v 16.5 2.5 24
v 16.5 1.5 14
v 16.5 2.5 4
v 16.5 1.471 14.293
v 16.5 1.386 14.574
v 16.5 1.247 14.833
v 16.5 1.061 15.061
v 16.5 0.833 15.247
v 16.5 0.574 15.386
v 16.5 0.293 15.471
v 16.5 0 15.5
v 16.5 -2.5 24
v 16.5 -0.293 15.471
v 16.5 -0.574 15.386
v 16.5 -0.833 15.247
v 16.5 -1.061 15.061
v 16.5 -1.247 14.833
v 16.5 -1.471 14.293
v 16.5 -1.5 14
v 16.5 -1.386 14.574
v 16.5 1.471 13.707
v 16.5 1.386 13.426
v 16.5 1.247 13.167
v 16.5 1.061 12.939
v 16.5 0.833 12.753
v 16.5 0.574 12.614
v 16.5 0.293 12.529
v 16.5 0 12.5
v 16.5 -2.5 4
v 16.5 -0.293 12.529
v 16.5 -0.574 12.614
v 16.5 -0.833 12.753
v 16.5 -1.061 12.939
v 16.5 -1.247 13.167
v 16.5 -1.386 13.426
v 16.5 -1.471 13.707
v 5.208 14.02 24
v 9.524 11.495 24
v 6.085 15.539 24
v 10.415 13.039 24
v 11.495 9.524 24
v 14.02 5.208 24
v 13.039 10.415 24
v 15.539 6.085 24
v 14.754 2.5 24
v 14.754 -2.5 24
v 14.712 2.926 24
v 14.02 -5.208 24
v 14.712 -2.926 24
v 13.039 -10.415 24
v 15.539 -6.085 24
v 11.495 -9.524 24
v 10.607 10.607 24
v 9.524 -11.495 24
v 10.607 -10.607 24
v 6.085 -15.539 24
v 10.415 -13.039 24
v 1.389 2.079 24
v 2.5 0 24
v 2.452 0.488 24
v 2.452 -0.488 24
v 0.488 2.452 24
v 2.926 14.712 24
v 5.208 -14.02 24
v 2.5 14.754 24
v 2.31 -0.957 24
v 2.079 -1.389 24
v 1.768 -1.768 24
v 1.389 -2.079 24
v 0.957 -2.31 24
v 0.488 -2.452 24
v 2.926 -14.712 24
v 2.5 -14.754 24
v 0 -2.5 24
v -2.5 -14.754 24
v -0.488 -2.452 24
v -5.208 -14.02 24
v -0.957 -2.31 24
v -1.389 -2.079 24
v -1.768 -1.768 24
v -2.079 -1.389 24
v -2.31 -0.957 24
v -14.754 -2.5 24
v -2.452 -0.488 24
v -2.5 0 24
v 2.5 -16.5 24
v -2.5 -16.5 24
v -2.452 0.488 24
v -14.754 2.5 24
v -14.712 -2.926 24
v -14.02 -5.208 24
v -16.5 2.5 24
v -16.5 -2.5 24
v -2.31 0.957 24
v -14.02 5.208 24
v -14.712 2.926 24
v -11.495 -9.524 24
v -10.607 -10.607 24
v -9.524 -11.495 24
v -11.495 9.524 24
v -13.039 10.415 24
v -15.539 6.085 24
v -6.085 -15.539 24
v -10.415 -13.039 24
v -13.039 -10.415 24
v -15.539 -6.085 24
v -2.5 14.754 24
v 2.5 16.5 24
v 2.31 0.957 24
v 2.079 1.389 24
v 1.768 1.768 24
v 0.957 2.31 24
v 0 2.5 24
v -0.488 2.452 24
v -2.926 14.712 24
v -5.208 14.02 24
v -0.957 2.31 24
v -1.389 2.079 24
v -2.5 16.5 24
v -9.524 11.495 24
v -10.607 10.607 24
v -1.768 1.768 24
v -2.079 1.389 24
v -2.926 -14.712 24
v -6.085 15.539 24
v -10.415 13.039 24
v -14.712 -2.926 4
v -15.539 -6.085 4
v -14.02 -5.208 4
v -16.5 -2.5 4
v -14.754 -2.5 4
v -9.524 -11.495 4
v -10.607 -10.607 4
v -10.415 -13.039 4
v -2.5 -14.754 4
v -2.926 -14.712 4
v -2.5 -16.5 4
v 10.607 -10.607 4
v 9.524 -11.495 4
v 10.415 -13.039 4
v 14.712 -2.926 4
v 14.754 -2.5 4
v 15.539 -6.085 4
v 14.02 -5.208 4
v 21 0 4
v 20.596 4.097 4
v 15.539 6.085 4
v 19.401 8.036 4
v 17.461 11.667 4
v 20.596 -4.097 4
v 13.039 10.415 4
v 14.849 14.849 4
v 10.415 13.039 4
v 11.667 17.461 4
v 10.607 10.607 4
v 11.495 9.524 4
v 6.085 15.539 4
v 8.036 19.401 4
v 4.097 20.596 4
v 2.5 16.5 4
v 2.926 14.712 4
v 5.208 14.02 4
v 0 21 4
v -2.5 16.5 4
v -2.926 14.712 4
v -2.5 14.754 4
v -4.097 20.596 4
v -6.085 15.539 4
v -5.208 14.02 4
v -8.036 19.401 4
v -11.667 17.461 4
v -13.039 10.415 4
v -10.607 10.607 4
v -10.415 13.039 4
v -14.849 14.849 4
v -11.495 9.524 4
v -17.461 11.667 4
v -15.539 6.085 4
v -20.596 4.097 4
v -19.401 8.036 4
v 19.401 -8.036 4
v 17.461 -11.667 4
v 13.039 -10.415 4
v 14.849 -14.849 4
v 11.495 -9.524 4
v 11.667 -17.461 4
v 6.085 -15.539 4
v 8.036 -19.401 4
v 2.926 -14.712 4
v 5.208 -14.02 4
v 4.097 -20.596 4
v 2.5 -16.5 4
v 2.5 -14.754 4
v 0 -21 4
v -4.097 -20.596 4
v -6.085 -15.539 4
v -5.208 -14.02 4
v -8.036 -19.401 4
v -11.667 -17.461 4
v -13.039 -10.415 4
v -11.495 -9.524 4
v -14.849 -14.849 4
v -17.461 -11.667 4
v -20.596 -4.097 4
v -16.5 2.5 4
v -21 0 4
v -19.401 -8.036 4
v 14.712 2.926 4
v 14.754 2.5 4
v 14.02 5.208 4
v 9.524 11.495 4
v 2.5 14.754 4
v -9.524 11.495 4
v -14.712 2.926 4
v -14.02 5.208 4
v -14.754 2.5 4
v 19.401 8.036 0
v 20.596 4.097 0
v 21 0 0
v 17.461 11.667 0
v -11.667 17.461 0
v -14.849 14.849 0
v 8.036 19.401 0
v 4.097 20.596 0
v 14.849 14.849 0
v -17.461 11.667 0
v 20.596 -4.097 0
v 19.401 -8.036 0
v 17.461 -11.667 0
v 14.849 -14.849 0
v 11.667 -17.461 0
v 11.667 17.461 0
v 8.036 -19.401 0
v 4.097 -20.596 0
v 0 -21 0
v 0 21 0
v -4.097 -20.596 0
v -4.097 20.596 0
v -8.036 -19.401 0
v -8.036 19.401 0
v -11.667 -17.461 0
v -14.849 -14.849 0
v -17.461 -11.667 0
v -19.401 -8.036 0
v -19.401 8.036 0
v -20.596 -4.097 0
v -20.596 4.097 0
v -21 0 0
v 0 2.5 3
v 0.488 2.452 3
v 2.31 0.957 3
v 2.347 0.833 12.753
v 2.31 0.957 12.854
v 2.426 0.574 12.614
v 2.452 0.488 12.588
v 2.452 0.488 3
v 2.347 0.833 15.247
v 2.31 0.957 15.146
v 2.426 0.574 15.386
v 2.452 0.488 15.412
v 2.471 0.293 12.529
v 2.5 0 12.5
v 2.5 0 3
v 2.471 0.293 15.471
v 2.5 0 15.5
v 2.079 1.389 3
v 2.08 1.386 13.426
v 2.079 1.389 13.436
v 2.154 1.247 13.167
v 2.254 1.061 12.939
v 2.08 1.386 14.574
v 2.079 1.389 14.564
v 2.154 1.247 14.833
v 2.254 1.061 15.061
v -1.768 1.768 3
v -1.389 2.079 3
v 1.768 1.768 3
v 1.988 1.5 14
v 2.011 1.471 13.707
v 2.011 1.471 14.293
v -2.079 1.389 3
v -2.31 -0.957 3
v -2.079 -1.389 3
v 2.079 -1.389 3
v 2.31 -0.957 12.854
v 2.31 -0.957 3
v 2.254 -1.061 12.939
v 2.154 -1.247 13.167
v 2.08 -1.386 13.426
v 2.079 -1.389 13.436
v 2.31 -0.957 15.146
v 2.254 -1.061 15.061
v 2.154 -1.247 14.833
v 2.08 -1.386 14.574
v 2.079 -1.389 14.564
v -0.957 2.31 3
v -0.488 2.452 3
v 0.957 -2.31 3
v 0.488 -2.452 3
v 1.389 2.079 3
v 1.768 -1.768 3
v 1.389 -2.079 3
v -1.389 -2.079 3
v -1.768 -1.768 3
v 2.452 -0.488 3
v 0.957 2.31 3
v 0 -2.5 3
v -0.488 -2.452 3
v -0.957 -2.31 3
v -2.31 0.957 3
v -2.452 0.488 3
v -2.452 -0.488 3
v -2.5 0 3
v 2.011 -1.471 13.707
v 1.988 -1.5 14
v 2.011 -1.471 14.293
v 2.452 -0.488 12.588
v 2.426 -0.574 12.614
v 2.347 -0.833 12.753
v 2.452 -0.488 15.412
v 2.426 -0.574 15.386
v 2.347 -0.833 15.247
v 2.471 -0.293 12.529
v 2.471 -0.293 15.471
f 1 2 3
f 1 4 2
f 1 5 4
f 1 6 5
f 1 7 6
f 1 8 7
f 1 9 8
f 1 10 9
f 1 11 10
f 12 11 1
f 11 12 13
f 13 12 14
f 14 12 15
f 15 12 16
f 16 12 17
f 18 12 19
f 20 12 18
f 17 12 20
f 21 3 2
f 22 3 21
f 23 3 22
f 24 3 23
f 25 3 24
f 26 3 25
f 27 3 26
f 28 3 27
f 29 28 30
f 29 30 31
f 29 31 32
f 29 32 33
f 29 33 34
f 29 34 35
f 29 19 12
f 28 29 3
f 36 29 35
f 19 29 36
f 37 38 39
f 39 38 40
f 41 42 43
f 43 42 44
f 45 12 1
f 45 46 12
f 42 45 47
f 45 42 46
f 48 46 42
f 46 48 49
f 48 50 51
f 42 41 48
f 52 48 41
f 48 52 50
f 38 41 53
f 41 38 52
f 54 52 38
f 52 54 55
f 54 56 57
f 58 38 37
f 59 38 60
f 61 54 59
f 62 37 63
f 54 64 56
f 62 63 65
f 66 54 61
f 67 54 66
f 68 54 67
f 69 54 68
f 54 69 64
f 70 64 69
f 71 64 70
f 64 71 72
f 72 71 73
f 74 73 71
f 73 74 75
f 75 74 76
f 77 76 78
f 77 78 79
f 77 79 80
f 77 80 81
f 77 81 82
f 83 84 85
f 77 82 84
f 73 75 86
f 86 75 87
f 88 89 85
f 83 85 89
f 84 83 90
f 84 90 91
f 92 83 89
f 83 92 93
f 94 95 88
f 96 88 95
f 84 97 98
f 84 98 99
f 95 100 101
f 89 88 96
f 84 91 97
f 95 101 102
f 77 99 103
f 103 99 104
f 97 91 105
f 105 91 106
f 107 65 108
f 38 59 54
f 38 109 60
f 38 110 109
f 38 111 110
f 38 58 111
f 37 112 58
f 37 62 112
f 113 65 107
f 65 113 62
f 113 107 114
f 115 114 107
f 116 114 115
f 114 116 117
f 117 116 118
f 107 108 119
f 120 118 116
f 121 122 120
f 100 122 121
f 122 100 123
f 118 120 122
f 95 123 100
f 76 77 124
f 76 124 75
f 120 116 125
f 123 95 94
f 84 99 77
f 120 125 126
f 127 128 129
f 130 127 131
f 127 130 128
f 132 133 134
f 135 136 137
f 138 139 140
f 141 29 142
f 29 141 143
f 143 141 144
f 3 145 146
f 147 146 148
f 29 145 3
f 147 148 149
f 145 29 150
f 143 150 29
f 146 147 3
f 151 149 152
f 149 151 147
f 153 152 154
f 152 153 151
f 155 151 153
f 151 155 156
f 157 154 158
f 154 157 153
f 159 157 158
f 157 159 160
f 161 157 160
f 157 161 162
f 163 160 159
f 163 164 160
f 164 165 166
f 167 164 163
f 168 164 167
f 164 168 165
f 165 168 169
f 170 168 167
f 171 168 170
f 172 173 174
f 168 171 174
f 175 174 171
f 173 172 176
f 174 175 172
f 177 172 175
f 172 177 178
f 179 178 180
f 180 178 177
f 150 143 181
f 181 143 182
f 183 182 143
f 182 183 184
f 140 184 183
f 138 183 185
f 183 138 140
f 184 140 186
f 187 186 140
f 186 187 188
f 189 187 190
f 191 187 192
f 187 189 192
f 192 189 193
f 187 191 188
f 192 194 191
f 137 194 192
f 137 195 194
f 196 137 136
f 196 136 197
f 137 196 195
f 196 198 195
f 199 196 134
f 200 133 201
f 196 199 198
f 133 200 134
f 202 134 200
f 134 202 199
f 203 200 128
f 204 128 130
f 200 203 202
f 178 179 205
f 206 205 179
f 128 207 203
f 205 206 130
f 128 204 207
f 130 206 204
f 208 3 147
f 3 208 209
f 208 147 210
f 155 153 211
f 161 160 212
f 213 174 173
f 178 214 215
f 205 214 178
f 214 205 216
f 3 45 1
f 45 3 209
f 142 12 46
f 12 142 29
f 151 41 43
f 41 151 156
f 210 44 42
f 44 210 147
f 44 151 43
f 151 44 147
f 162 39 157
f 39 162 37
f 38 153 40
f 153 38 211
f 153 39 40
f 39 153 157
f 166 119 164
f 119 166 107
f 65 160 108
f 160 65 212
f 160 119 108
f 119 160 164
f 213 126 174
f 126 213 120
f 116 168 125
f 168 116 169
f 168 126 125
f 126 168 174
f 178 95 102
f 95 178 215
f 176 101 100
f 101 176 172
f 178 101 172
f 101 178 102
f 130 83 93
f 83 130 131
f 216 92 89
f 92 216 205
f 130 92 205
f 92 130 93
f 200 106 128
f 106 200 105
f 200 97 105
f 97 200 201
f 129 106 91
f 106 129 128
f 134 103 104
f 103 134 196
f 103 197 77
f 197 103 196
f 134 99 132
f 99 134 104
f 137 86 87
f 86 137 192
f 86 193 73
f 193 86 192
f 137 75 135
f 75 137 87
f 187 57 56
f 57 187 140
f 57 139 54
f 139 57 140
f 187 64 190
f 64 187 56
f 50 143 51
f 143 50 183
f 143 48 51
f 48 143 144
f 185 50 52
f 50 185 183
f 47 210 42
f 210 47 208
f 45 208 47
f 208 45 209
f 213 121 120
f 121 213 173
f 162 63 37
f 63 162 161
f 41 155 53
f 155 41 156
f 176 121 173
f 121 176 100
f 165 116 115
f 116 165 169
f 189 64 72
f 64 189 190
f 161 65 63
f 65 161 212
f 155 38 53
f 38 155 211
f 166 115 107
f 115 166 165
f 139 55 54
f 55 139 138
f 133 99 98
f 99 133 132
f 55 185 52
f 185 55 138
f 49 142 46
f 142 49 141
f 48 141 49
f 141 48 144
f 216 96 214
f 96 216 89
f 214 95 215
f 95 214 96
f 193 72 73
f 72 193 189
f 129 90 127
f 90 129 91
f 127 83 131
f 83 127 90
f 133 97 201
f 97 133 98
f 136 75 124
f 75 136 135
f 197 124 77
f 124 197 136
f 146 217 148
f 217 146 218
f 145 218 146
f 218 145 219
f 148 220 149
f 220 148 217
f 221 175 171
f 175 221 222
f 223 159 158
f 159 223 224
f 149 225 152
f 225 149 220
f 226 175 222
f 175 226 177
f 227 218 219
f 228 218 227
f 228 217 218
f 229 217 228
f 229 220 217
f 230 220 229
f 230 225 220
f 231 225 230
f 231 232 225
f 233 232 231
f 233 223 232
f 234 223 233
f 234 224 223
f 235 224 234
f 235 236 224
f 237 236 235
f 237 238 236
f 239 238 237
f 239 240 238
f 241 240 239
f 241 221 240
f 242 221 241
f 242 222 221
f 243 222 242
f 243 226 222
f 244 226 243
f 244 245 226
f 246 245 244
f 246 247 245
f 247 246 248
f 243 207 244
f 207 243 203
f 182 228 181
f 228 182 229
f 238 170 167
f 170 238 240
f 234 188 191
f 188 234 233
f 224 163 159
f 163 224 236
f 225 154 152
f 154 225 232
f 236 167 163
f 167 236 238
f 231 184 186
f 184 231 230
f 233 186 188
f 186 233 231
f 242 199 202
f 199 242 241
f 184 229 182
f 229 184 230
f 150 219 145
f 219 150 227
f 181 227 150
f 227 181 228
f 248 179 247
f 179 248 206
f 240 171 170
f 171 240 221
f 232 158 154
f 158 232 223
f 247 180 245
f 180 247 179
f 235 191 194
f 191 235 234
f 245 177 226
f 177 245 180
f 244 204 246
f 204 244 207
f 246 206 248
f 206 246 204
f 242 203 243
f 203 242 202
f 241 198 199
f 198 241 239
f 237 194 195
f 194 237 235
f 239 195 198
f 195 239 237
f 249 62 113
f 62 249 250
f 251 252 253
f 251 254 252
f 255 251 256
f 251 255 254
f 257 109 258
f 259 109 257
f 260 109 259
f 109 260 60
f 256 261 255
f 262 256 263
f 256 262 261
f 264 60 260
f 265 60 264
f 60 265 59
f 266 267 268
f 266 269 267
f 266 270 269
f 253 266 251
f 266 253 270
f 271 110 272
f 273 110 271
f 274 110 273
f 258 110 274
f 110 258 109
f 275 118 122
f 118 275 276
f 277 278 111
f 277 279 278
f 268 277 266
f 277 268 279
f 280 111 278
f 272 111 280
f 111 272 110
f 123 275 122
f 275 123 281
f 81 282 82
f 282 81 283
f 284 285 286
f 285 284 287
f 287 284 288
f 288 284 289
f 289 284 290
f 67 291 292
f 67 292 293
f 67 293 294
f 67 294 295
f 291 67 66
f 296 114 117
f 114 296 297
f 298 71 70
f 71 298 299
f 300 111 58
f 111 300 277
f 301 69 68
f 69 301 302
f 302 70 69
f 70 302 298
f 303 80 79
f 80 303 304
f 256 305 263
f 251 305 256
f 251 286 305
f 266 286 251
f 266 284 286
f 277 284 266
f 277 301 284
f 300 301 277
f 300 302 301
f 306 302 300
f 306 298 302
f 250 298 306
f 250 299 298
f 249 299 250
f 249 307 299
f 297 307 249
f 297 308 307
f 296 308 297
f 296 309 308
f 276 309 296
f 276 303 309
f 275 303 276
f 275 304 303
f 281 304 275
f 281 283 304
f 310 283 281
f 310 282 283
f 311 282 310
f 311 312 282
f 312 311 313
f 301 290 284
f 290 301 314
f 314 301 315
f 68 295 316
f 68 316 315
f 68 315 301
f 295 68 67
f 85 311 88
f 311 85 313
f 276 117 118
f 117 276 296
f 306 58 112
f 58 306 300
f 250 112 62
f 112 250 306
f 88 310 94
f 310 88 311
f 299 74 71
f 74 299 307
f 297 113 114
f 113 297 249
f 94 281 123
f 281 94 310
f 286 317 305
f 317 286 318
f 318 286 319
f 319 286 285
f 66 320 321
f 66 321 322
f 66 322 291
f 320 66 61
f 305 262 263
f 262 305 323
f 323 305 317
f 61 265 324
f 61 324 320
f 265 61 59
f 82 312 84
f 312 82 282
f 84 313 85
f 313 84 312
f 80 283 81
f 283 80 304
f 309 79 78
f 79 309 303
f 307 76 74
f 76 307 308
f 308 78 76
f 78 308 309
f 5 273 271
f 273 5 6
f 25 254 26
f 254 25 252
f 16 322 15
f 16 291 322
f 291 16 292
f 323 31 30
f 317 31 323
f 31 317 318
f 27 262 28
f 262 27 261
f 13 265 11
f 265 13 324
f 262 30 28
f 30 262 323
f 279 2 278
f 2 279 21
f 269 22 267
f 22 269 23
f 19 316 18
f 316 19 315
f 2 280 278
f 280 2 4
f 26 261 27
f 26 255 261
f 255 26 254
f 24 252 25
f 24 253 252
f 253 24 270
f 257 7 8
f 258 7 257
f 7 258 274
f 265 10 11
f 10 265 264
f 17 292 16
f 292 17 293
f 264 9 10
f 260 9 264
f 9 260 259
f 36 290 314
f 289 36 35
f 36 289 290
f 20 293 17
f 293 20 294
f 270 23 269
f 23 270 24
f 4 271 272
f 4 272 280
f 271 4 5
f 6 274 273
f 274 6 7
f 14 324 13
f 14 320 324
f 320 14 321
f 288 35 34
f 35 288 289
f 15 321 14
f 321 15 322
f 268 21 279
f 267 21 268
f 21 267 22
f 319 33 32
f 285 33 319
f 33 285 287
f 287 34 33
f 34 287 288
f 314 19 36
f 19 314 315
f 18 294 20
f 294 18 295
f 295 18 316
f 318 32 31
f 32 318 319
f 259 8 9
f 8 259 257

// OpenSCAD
$fn = 32;

// ----------------------------------------------------------------------
// Control knob: skirt knob with grip ribs
// ----------------------------------------------------------------------

// --- parameters (mm) ---
skirt_d = 42;             // skirt diameter
skirt_t = 4;              // skirt thickness
rib_w = 5;                // grip rib width
rib_out = 2.5;            // grip rib radial protrusion
n_ribs = 12;              // number of grip ribs
knob_d = 30;              // knob body diameter
knob_h = 20;              // knob body height
bore_d = 5;               // shaft bore diameter
set_d = 3;                // set screw bore diameter

rib_step = 360 / n_ribs;  // rib angular step
total_h = skirt_t + knob_h;  // overall height

difference() {
  union() {
    translate([0, 0, skirt_t]) cylinder(h = knob_h, d = knob_d);
    cylinder(h = skirt_t, d = skirt_d);
    for (i = [0 : n_ribs - 1])
      rotate([0, 0, i * rib_step])
        translate([knob_d / 2 - 1, -rib_w / 2, skirt_t])
          cube([rib_out, rib_w, knob_h]);
  }
  translate([0, 0, skirt_t - 1]) cylinder(h = knob_h + 2, d = bore_d);
  translate([-1, 0, skirt_t + knob_h / 2]) rotate([0, 90, 0])
    cylinder(h = knob_d / 2 + bore_d / 2 + 2, d = set_d);
}
